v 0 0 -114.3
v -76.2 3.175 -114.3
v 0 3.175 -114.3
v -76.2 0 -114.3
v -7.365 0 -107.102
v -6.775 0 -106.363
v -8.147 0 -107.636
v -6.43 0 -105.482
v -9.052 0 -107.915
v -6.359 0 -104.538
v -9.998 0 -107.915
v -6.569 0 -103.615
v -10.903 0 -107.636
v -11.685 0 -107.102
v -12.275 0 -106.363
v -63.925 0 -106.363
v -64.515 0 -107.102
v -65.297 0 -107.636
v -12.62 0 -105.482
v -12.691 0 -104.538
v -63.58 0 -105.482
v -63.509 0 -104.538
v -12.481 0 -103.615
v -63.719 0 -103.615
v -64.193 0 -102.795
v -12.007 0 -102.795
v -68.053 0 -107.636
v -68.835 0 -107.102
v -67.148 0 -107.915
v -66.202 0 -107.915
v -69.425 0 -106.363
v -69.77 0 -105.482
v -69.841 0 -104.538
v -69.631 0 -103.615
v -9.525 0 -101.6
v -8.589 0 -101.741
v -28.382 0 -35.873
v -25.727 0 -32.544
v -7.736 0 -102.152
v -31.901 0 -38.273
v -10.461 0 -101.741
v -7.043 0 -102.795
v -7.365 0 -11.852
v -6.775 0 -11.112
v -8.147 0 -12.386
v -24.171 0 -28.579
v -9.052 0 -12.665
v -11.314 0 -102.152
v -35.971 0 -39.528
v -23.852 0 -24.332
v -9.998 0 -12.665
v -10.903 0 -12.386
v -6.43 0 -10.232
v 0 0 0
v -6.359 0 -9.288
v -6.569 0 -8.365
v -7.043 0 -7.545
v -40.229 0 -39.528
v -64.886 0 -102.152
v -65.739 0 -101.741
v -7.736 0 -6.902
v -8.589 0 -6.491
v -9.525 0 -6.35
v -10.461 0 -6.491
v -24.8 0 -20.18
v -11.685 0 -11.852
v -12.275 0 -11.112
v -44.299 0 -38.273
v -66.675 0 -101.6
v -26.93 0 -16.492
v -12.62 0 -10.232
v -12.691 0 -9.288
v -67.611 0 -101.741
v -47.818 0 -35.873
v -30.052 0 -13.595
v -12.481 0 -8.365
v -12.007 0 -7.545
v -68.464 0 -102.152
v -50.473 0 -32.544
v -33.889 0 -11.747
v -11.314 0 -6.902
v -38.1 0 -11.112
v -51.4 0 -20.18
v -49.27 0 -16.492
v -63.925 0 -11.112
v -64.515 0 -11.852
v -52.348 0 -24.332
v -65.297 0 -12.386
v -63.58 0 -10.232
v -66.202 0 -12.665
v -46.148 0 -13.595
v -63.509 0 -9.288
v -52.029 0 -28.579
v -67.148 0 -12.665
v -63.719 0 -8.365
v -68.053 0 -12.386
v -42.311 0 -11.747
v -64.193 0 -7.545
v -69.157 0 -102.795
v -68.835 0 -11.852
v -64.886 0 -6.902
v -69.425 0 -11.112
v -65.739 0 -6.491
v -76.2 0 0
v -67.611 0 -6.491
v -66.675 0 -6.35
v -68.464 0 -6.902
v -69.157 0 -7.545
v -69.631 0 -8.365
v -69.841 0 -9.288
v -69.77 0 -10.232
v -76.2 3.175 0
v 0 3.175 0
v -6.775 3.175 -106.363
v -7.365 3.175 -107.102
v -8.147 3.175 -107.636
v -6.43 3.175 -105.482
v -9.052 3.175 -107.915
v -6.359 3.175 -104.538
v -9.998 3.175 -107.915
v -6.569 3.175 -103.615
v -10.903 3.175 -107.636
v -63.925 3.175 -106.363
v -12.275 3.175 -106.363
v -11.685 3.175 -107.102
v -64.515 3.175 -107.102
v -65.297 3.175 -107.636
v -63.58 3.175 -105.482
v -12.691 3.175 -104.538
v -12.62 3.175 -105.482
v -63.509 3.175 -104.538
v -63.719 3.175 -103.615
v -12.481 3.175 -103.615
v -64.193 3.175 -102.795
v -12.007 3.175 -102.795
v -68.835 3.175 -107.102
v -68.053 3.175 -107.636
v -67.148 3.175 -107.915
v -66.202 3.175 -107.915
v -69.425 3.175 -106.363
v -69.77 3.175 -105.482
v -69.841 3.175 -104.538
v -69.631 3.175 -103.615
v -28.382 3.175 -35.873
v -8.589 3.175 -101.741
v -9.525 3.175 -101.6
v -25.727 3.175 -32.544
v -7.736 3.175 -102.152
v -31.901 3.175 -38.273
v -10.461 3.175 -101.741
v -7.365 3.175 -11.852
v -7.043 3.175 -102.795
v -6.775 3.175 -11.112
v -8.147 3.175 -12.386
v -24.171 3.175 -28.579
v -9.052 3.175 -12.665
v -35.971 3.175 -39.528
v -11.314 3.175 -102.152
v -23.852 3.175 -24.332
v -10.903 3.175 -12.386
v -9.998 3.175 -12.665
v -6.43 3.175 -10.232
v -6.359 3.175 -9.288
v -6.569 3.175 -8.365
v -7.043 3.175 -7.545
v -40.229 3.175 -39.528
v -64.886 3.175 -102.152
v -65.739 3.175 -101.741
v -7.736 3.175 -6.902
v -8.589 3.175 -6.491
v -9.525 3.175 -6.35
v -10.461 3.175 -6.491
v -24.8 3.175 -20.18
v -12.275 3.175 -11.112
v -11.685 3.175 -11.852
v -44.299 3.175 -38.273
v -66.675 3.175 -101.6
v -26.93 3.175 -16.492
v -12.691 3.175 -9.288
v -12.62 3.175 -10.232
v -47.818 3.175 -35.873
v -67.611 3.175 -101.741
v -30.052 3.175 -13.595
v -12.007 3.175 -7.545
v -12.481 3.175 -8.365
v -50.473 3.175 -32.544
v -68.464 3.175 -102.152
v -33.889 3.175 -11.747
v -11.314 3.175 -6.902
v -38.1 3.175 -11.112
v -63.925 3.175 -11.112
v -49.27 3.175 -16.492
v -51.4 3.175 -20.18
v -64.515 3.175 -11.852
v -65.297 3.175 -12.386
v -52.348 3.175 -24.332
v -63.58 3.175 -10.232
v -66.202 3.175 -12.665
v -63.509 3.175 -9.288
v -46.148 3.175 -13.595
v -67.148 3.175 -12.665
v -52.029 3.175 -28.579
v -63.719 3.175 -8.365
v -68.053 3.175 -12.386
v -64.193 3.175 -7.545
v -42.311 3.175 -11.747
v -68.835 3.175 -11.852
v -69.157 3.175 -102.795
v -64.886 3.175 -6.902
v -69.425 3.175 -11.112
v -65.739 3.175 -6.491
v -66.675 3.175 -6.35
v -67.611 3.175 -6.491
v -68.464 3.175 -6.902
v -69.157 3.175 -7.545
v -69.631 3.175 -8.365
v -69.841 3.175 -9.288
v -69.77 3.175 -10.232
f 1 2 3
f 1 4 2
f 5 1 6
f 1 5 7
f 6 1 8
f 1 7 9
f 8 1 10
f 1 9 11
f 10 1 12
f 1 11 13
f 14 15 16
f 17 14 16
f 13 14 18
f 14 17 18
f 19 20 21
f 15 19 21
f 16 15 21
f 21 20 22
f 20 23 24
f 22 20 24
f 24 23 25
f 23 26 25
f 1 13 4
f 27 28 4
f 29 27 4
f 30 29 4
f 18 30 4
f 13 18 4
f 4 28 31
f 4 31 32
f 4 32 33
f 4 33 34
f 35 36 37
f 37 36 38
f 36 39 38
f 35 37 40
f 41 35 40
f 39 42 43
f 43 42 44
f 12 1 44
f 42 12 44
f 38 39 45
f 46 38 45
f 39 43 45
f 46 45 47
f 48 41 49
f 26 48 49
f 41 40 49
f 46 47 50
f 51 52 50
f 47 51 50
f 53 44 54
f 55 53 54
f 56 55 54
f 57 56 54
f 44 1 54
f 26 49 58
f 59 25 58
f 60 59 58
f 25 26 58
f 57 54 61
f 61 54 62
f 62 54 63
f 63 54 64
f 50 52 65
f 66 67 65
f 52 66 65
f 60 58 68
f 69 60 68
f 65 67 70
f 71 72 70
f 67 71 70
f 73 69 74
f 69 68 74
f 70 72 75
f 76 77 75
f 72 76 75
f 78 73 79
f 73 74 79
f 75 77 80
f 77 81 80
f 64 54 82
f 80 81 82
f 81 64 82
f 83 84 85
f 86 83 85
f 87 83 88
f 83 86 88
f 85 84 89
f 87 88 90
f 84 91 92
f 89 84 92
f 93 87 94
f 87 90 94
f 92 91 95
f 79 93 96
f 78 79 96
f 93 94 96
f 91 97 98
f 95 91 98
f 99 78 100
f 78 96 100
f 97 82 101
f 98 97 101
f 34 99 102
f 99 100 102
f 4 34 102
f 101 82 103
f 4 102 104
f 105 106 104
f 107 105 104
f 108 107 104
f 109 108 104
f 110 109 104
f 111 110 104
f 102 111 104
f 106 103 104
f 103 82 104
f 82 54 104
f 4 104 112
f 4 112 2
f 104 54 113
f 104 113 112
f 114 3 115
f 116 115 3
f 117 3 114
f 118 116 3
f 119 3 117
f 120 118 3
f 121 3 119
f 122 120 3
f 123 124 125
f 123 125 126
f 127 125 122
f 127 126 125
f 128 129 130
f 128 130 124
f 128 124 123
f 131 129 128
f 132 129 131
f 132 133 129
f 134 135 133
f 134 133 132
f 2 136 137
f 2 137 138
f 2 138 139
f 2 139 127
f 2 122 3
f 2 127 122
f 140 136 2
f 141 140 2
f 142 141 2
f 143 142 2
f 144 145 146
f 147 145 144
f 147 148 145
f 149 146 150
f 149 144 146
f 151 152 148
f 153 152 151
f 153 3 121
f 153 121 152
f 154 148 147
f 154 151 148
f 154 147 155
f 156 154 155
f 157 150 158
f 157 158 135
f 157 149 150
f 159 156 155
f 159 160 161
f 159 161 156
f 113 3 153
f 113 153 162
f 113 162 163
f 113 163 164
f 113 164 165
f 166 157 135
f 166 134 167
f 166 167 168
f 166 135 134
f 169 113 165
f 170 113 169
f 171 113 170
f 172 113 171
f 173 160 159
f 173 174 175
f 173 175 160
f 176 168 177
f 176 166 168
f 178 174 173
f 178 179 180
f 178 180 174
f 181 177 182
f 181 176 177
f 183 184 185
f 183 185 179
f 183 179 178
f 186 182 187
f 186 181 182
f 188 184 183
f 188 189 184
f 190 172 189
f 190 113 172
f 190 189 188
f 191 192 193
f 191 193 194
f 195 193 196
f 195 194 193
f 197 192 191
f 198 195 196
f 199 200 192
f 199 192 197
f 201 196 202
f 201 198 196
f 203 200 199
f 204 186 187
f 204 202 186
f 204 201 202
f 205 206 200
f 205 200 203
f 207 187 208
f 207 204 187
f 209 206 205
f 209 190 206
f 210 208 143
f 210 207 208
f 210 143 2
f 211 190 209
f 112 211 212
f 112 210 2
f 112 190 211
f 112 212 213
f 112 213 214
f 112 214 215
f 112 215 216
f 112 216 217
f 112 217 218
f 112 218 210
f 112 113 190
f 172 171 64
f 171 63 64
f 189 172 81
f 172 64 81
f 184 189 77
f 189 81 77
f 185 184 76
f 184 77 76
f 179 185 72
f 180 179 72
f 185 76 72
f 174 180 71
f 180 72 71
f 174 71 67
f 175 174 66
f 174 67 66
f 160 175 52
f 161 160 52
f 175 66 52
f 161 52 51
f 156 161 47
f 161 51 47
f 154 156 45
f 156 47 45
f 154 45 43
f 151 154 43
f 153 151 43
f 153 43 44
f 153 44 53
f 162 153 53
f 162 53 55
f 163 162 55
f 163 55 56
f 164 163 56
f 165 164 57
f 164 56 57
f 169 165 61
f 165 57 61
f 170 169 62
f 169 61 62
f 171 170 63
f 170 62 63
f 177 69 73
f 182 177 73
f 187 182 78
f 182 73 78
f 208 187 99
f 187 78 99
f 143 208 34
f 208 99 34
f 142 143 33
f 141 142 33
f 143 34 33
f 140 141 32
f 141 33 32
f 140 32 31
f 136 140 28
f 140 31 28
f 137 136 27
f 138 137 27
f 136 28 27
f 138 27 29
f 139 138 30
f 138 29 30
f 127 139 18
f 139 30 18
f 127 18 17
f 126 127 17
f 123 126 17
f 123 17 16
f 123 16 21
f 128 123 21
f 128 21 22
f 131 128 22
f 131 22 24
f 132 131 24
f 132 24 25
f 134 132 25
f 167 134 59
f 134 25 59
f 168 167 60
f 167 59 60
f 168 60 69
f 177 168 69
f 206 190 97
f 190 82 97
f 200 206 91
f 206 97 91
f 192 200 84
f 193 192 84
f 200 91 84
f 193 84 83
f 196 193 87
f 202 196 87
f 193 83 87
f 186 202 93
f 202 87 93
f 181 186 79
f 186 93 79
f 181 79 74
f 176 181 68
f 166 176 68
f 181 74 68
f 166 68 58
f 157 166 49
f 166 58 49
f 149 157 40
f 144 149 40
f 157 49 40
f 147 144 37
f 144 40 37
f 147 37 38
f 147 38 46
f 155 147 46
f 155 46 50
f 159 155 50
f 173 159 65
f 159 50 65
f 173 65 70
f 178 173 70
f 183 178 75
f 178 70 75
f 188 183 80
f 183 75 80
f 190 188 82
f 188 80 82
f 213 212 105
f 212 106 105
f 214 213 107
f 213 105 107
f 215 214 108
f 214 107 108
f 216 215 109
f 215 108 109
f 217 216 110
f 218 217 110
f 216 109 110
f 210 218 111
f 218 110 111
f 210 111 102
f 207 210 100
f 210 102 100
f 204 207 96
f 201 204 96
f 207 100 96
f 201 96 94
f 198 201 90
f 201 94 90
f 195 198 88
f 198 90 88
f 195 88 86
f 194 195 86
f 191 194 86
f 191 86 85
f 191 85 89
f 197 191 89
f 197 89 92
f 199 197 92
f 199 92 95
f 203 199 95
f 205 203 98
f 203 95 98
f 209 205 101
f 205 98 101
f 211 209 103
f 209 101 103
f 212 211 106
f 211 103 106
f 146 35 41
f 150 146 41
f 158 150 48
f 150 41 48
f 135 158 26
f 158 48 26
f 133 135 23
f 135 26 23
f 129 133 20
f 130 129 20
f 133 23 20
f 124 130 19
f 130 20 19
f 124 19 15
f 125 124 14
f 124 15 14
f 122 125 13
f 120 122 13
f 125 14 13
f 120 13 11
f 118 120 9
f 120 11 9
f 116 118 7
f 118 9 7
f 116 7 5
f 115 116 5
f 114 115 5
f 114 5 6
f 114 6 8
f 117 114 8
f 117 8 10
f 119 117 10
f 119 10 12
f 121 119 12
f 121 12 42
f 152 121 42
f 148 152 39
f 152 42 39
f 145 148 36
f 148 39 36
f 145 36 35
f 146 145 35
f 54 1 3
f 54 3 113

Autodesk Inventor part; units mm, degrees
ref_plane "YZ Plane" through (0, 0, 0) normal (1, 0, 0) x (0, 1, 0)
ref_plane "XZ Plane" through (0, 0, 0) normal (0, 1, 0) x (-1, 0, 0)
ref_plane "XY Plane" through (0, 0, 0) normal (0, 0, 1) x (1, 0, 0)
sketch "Sketch1" plane through (0, 0, 0) normal (0, 1, 0) x (-1, 0, 0)
  line L0 (0, 0) -> (76.2, 0)
  line L1 (76.2, 0) -> (76.2, -114.3)
  line L2 (76.2, -114.3) -> (0, -114.3)
  line L3 (0, -114.3) -> (0, 0)
  dimension "d0" = 76.2
  dimension "d1" = 114.3
extrude "Extrusion1" add sketch "Sketch1" along normal blind 3.175
hole "Hole1" at (-9.525, 3.175, -9.525) direction (0, -1, 0) diameter 6.35 depth 25.4 tip angle 118
hole "Hole2" at (-9.525, 3.175, -104.775) direction (0, -1, 0) diameter 6.35 depth 25.4 tip angle 118
hole "Hole3" at (-66.675, 3.175, -104.775) direction (0, -1, 0) diameter 6.35 depth 25.4 tip angle 118
hole "Hole4" at (-66.675, 3.175, -9.525) direction (0, -1, 0) diameter 6.35 depth 25.4 tip angle 118
hole "Hole5" at (-38.1, 3.175, -25.4) direction (0, -1, 0) diameter 28.575 depth 25.4 tip angle 118
properties part number "Back Gearbox Plate"
